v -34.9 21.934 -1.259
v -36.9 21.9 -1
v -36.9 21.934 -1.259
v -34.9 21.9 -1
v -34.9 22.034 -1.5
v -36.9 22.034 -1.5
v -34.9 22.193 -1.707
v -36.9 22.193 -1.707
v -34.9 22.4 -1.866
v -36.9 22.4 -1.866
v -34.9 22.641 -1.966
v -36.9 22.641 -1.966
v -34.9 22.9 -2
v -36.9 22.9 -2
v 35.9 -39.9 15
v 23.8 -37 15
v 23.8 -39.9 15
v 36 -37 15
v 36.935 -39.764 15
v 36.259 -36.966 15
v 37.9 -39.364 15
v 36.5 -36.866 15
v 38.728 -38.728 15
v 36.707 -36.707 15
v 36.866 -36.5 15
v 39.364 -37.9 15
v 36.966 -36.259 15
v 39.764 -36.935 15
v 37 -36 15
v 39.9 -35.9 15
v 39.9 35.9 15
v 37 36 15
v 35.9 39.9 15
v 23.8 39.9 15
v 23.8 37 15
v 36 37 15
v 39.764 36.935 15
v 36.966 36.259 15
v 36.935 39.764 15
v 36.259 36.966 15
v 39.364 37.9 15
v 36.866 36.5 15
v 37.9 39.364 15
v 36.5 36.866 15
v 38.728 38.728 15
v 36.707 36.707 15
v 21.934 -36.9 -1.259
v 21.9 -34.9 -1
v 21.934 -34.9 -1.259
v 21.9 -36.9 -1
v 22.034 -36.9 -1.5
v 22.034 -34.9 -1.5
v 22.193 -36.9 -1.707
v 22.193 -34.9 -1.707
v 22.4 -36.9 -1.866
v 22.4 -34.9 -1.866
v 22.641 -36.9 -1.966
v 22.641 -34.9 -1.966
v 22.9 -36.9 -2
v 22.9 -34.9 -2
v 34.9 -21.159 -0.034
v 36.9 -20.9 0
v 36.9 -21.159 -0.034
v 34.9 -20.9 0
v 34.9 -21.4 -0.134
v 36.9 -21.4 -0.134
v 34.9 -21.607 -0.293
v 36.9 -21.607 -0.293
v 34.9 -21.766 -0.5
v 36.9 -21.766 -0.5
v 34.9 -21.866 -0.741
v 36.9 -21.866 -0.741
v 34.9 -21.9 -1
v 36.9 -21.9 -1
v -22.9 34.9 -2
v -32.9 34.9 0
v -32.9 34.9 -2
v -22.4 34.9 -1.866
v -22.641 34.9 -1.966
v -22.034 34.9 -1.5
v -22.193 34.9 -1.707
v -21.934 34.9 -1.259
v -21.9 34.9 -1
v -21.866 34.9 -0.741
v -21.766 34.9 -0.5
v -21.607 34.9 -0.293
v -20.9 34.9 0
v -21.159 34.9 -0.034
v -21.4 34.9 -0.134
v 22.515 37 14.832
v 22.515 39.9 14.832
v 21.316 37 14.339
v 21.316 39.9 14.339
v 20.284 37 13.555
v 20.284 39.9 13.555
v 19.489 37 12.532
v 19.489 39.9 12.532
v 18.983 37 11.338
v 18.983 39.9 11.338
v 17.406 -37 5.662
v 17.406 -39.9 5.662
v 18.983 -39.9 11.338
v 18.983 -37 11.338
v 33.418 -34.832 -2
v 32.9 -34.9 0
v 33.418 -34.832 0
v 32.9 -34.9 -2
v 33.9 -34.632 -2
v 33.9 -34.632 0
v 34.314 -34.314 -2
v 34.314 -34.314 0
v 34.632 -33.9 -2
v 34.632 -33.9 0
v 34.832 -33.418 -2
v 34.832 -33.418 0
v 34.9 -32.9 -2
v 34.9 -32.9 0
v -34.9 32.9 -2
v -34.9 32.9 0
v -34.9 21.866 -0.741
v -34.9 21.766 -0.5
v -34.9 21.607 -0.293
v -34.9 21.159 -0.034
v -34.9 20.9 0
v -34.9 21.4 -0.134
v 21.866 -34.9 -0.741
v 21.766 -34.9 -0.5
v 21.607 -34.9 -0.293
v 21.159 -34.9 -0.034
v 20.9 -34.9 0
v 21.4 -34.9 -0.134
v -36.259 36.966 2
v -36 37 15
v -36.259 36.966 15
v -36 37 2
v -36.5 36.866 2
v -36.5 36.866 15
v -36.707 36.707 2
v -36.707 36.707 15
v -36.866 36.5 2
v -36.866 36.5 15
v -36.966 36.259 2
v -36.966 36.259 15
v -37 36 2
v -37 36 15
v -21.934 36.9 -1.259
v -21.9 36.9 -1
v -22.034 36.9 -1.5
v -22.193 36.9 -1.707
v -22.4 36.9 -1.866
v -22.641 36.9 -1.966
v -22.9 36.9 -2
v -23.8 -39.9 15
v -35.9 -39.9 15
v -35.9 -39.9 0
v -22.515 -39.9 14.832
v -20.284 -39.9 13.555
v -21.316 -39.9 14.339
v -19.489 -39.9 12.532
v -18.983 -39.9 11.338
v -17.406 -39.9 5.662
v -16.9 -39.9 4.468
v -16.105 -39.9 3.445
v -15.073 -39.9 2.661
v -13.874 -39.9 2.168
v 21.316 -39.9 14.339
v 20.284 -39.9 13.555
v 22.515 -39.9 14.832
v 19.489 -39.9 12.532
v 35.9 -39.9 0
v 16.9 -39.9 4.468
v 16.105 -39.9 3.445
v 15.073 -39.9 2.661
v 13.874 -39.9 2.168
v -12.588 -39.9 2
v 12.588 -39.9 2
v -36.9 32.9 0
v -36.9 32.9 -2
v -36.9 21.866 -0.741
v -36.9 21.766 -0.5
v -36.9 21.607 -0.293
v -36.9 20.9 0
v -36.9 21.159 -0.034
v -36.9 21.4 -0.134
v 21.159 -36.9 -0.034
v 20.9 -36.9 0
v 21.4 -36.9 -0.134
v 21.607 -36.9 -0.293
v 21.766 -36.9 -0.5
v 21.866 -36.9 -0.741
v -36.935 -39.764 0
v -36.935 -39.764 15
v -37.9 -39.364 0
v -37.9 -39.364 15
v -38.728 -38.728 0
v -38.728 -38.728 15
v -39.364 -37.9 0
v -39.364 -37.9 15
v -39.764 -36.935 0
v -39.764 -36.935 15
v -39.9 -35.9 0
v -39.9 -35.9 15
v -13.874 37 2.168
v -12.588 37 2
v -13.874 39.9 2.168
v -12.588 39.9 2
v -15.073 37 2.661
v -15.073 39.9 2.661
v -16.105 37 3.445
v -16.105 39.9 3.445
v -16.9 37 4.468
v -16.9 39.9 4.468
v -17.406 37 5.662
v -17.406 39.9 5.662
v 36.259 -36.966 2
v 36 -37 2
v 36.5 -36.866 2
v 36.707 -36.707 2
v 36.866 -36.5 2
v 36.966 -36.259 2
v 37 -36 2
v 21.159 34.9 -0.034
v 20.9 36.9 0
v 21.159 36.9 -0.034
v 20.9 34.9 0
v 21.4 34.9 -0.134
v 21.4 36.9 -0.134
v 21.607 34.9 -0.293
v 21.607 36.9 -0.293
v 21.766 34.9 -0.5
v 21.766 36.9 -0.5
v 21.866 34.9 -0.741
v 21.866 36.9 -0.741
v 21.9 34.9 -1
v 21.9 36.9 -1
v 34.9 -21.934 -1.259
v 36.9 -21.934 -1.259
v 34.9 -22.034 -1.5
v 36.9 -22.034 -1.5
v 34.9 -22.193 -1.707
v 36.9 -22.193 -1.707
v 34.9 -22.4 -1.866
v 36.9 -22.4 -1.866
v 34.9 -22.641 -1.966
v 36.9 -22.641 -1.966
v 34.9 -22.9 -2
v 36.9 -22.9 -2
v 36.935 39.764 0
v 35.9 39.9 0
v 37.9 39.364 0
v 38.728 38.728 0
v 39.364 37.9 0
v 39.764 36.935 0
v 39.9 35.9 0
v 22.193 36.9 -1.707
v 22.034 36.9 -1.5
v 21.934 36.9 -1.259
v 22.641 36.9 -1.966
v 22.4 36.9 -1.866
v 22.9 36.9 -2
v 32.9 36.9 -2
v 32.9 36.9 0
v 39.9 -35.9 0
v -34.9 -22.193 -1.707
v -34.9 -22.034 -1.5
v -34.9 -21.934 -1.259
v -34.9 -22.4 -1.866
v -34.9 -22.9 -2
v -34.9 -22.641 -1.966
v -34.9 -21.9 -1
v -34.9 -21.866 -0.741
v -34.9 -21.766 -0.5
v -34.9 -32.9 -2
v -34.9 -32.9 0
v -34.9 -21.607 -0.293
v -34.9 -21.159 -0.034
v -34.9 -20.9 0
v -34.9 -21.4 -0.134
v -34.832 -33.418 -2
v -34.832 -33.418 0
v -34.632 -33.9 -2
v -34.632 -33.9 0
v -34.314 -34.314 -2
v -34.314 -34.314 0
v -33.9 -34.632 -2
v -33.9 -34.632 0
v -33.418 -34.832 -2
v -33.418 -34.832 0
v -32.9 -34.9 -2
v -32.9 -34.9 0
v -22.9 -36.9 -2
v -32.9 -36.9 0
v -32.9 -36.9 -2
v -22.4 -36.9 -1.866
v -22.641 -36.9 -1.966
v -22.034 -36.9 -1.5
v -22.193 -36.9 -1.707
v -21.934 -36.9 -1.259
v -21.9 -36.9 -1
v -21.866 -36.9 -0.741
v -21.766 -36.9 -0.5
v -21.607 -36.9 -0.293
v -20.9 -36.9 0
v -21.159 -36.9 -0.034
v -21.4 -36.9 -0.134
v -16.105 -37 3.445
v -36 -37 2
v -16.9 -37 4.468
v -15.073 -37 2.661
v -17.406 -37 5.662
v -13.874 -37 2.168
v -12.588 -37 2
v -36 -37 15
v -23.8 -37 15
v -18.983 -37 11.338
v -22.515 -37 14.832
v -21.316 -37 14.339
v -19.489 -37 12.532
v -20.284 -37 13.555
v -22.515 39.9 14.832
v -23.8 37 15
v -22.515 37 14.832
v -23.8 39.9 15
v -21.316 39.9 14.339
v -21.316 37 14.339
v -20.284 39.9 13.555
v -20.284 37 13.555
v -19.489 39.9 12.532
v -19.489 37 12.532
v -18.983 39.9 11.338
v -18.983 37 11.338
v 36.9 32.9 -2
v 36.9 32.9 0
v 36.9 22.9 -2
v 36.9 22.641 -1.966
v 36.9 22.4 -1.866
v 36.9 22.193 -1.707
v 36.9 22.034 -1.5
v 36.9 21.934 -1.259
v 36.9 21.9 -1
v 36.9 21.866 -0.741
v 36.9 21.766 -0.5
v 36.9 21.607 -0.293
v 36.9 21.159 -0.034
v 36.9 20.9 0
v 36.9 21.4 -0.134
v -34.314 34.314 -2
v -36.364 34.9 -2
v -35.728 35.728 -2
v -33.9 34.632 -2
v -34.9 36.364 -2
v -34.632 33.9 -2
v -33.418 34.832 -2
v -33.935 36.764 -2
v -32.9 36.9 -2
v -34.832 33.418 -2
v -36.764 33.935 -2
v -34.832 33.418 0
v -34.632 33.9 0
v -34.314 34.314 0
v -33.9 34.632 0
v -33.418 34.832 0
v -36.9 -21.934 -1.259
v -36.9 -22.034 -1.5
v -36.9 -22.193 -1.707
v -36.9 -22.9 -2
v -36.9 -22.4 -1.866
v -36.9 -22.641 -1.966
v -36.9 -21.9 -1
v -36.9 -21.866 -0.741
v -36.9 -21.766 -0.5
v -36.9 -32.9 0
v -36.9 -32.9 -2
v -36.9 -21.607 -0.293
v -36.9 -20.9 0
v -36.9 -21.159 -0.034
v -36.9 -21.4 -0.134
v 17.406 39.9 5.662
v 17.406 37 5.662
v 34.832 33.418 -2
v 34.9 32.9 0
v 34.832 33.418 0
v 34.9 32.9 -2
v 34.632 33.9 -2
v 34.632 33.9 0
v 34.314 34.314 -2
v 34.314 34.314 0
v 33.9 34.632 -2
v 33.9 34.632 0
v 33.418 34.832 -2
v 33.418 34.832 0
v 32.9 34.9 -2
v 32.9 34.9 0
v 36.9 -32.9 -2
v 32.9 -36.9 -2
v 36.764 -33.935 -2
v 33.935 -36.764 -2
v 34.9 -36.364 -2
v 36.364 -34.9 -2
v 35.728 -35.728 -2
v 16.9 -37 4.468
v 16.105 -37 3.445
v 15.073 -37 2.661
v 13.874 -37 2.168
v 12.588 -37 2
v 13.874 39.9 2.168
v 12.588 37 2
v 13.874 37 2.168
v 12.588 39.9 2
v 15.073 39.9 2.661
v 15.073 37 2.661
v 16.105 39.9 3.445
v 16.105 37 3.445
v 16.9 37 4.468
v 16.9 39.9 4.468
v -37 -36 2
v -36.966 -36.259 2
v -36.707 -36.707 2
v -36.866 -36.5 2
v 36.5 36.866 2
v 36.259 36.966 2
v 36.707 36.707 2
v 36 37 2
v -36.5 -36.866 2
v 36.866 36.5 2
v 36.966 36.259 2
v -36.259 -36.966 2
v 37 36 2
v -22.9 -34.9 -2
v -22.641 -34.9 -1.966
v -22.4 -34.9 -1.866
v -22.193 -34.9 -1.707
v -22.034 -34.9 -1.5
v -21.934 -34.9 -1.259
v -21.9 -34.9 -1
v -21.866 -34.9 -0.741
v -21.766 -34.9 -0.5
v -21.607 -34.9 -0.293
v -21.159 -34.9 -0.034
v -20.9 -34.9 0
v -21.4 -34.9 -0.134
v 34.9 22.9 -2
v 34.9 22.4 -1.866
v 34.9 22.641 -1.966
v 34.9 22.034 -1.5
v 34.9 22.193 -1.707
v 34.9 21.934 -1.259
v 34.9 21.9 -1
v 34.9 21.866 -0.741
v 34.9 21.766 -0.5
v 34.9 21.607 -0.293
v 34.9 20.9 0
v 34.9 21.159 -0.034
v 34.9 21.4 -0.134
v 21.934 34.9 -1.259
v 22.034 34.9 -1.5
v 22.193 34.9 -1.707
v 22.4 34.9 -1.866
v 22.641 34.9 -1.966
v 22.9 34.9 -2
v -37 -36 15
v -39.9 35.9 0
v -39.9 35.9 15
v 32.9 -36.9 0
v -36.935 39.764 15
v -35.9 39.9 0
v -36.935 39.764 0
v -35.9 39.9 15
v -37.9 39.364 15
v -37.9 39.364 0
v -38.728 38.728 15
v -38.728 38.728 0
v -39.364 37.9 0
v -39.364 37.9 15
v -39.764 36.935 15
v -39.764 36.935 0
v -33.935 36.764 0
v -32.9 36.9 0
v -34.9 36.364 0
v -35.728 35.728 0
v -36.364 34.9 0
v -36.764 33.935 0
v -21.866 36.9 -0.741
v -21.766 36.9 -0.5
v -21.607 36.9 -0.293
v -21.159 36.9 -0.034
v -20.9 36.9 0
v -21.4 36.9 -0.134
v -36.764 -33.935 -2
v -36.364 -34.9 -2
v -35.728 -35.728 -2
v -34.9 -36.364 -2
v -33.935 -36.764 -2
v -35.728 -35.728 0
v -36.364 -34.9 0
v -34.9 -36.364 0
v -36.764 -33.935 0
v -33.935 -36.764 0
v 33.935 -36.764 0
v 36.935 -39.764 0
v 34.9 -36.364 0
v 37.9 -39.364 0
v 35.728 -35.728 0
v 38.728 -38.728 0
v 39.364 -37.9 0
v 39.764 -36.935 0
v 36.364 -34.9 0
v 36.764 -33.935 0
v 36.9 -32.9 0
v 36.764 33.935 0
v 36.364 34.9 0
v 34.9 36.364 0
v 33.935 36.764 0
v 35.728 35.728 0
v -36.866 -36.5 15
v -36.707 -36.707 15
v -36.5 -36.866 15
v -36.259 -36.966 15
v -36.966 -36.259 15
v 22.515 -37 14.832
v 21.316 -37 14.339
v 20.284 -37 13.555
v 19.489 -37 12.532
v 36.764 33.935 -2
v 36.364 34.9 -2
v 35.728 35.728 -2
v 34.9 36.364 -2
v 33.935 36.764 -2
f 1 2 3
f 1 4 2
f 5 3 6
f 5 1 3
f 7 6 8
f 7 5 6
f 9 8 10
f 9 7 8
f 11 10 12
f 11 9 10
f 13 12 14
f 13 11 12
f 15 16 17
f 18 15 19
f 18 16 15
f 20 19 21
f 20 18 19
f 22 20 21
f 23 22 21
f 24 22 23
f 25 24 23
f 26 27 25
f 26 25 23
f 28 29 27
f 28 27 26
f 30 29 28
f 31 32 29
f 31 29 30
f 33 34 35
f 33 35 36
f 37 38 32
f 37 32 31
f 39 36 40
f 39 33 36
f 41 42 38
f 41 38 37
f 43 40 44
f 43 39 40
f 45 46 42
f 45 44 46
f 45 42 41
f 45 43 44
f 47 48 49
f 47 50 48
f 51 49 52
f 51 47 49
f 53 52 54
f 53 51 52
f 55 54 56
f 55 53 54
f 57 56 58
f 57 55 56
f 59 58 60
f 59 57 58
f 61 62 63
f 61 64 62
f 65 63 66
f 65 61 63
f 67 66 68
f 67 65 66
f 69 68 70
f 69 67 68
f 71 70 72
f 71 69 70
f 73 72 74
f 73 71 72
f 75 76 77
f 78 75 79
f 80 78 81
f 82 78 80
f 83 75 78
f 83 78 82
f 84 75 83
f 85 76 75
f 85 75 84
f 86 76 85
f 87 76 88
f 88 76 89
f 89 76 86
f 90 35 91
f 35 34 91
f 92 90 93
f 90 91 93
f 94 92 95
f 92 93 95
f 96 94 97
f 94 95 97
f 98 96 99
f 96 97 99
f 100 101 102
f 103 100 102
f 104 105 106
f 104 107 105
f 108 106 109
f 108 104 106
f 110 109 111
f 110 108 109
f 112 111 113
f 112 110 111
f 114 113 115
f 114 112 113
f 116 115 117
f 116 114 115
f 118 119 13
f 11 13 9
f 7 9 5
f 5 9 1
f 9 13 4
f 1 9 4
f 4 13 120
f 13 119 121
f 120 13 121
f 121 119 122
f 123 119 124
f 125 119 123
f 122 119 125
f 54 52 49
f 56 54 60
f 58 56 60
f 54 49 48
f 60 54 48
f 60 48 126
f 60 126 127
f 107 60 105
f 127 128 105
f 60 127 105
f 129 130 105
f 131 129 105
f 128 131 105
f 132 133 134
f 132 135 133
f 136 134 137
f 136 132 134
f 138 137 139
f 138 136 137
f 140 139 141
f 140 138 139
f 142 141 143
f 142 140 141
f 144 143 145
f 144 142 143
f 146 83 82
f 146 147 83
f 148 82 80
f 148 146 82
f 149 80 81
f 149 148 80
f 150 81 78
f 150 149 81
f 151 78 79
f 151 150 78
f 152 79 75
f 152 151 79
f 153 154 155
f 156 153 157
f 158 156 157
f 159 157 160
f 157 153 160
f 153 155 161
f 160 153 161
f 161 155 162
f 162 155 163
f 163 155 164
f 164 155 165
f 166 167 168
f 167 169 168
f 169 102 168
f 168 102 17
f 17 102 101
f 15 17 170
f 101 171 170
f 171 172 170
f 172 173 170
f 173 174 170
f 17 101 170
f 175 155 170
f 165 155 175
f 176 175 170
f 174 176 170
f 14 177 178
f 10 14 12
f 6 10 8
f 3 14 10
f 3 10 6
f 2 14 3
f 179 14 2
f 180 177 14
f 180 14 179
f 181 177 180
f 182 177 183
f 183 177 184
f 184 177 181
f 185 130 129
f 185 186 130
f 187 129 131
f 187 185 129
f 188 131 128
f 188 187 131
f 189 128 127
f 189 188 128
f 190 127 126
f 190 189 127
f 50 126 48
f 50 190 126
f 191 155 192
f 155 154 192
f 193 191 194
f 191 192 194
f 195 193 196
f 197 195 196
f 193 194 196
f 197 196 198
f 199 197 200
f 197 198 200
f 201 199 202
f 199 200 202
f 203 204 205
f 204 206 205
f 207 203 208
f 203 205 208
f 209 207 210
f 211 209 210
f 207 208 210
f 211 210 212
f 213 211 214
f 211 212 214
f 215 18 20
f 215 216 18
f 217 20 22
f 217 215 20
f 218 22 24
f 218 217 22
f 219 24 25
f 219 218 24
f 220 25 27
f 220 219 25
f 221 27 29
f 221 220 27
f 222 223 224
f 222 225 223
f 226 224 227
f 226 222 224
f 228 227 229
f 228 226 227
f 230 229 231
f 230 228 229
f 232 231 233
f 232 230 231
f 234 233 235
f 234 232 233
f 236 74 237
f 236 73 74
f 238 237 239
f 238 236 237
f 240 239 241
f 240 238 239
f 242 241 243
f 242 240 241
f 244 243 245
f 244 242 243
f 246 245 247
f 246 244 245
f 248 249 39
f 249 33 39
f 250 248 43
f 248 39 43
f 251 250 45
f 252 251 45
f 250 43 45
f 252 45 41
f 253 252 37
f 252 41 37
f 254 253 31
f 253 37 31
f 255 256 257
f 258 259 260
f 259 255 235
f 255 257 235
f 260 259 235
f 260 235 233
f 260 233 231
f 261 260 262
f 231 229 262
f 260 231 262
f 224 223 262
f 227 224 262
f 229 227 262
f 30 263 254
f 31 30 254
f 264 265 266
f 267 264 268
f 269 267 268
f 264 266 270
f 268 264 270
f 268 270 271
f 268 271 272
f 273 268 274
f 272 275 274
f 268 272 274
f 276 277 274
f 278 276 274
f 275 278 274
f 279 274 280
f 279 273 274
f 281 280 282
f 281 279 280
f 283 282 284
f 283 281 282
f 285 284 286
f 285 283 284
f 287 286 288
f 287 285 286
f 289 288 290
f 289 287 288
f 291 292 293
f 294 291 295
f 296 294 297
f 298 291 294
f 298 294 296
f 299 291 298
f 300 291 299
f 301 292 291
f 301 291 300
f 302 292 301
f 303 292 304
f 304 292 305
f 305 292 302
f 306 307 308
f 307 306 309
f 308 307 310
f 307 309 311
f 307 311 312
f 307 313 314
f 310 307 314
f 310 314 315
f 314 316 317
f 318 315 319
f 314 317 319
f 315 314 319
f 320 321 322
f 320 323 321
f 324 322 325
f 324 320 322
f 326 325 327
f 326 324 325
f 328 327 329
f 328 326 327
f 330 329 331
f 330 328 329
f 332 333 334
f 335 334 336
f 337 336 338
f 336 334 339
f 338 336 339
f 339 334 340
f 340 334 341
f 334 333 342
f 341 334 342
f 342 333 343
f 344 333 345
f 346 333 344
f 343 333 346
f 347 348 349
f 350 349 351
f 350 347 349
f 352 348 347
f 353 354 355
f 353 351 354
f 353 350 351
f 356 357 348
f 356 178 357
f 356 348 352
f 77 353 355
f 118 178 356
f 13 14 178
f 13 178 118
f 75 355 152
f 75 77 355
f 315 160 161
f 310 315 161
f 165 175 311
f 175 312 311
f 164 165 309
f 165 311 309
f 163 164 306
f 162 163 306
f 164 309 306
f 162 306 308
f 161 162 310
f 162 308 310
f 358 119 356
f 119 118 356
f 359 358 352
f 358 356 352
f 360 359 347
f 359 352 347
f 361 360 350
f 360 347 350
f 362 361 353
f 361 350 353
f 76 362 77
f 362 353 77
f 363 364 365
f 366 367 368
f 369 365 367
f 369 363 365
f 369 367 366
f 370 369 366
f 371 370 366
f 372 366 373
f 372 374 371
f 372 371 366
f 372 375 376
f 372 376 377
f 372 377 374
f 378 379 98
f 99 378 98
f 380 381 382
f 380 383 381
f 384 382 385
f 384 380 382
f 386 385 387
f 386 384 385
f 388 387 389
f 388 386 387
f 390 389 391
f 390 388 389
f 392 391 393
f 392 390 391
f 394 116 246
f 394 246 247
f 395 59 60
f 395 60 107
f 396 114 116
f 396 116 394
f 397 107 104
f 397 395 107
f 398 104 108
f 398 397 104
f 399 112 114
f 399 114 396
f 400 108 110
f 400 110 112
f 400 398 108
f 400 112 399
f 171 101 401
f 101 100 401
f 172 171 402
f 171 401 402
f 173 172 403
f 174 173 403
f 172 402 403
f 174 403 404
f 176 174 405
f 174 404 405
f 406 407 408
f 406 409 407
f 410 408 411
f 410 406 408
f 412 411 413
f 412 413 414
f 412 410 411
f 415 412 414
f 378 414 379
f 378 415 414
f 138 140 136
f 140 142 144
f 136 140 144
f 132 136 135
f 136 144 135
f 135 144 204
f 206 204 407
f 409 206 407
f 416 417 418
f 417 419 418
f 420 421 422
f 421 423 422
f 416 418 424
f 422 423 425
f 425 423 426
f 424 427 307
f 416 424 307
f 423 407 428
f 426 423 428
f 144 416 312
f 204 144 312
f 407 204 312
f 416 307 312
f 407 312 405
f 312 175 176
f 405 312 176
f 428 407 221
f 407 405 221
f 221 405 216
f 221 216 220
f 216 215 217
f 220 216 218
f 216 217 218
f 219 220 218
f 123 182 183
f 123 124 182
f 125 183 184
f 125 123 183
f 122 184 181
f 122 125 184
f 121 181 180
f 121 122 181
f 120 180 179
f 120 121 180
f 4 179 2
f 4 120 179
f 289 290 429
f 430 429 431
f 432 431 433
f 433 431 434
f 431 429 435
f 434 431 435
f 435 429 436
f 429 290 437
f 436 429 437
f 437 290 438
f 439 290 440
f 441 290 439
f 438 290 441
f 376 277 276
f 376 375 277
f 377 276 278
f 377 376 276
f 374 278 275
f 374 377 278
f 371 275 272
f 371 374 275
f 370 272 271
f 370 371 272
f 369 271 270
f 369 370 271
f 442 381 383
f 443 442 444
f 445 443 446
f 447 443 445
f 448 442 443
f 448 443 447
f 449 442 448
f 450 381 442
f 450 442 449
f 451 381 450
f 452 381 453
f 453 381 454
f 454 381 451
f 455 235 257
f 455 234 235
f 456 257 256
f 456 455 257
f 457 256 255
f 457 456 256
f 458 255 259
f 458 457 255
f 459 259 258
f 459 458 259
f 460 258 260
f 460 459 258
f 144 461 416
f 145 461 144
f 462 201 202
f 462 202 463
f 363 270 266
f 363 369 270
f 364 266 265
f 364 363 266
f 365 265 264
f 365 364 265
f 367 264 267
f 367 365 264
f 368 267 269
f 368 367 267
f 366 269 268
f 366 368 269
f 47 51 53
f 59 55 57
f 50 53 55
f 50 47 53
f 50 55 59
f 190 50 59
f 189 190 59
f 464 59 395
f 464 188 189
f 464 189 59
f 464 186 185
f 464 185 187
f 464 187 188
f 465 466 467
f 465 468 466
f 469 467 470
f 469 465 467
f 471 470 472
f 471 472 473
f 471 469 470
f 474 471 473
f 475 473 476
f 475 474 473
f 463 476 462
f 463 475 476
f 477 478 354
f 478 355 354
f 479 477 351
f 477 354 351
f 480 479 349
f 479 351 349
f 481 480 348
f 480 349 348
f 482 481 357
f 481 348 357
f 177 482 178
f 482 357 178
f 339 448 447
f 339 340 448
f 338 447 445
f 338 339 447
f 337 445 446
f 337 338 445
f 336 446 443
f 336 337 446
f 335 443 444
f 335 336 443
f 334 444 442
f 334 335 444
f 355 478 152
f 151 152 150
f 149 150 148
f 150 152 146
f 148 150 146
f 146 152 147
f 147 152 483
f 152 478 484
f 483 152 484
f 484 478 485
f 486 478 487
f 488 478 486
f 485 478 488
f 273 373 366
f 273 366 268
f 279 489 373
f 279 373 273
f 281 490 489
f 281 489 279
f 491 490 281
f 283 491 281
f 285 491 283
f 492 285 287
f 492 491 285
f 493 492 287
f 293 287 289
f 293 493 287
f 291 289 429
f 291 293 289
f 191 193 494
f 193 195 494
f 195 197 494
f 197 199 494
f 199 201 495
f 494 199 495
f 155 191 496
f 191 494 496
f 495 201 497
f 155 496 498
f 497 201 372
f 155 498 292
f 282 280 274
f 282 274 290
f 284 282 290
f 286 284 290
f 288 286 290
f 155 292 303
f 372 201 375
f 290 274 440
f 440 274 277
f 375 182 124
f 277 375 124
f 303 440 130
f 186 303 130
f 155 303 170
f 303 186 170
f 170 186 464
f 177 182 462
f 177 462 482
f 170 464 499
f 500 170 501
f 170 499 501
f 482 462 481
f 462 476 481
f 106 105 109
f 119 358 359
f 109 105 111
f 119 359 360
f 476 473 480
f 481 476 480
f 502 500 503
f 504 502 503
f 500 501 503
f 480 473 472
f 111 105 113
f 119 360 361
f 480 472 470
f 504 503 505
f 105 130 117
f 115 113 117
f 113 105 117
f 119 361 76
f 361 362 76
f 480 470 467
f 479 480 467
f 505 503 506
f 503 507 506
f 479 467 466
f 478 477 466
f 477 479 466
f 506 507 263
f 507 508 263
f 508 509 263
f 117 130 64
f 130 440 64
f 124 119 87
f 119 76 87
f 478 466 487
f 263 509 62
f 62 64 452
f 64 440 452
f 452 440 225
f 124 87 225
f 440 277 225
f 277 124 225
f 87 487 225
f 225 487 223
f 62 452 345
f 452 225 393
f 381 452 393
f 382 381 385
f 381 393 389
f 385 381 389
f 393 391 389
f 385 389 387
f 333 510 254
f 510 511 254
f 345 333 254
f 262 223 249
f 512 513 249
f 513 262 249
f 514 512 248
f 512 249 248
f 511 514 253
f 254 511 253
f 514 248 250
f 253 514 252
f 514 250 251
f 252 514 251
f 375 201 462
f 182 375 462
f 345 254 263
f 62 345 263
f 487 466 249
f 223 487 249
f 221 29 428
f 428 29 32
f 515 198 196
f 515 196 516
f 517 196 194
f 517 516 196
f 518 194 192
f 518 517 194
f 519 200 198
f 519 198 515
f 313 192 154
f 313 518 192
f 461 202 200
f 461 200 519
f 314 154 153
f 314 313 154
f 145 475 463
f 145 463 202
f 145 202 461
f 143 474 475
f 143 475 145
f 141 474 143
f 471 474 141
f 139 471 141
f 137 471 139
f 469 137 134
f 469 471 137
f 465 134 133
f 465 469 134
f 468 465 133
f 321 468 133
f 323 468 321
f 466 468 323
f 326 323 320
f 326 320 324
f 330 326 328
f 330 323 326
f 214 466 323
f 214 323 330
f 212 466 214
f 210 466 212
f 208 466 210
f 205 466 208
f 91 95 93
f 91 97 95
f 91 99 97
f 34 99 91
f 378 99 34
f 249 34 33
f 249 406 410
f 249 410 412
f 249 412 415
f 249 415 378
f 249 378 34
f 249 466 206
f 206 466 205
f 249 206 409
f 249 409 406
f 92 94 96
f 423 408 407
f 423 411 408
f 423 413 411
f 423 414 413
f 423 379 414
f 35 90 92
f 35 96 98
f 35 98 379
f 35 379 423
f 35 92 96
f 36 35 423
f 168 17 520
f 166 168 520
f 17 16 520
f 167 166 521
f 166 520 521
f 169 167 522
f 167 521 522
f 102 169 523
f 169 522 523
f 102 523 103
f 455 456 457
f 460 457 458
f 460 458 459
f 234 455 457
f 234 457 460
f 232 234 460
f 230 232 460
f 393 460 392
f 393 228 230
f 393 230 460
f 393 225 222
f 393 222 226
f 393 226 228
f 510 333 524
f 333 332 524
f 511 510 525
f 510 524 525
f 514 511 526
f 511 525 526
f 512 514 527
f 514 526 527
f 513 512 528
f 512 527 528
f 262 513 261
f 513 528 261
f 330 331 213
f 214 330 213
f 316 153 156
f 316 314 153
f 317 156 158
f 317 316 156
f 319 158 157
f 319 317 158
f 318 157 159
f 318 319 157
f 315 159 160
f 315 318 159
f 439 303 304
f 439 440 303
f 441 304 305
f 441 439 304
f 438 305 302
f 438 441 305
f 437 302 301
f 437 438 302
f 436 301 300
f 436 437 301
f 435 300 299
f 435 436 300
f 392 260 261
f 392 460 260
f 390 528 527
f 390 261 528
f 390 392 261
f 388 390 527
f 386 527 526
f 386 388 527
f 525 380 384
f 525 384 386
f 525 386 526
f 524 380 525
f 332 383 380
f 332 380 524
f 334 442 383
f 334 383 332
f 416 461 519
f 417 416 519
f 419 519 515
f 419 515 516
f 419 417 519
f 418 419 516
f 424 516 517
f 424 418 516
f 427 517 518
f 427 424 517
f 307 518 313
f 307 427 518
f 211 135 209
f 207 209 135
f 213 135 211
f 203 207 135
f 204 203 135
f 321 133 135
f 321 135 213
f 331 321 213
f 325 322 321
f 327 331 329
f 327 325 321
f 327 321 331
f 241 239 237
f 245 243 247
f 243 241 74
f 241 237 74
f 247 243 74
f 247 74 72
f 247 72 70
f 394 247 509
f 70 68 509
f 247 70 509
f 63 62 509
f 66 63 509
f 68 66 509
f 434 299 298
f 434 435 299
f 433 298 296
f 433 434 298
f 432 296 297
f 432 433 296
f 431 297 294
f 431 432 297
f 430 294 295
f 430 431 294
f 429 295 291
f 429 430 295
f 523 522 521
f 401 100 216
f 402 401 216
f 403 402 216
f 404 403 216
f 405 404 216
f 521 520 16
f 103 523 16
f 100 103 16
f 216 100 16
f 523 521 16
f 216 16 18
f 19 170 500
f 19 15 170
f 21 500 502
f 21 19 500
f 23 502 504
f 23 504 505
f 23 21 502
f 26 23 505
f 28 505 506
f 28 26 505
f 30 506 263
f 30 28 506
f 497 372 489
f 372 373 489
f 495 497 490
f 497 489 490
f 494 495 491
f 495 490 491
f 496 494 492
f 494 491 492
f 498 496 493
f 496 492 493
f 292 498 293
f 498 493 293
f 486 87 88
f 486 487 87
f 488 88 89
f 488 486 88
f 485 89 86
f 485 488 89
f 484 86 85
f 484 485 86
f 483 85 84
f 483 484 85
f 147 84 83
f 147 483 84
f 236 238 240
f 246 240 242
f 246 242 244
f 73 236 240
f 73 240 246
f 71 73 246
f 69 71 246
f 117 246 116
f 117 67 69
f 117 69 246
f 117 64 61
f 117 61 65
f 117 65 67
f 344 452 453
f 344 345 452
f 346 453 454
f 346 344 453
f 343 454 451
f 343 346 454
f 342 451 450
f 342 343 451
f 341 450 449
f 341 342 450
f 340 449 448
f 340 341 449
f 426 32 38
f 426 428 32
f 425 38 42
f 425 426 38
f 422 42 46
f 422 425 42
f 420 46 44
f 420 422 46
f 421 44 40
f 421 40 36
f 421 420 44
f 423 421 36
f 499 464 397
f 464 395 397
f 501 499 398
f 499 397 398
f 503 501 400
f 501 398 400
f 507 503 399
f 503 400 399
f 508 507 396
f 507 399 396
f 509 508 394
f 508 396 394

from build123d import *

# Parameters (mm, degrees)
F0_W      = 79.8
F0_H      = 79.8
F1_DEPTH  = 15
F2_W      = 74
F2_H      = 74
F3_DEPTH  = 13
F4_W      = 73.8
F4_H      = 73.8
F4_W_2    = 69.8
F4_H_2    = 69.8
F5_DEPTH  = 2
F7_DEPTH  = 2
F8_R      = 2
F9_R      = 4
F10_R     = 0.99999
F12_DEPTH = 79.801
F13_R     = 5
F14_R     = 4
F15_R     = 1


# Not quite as in the source:
# - a fillet or chamfer is up to 0.001 mm smaller than in the source, because OpenCascade refuses the exact size


with BuildPart() as f1:
    # F0 (on Top) → F1 (new body)
    with BuildSketch(Plane.XY):
        Rectangle(F0_W, F0_H)
    extrude(amount=F1_DEPTH)

    # F2 (on face) → F3 (cut)
    with BuildSketch(Plane.XY.offset(15)):
        Rectangle(F2_W, F2_H)
    extrude(amount=-F3_DEPTH, mode=Mode.SUBTRACT)

    # F4 (on face) → F5 (join)
    with BuildSketch(Plane(origin=(0, 0, 0), x_dir=(1, 0, 0), z_dir=(0, 0, -1))):
        Rectangle(F4_W, F4_H)
        Rectangle(F4_W_2, F4_H_2, mode=Mode.SUBTRACT)
    extrude(amount=F5_DEPTH)

    # F6 (on face) → F7 (cut, through all)
    with BuildSketch(Plane(origin=(0, 0, -2), x_dir=(1, 0, 0), z_dir=(0, 0, -1))):
        Polygon((36.9, -21.9), (36.9, 21.9), (21.9, 21.9), (21.9, 36.9), (-21.9, 36.9), (-21.9, 21.9), (-36.9, 21.9), (-36.9, -21.9), (-21.9, -21.9), (-21.9, -36.9), (21.9, -36.9), (21.9, -21.9), align=None)
    extrude(amount=-F7_DEPTH, mode=Mode.SUBTRACT)

    # F8
    f8_edges = [f1.edges().sort_by_distance(p)[0] for p in [
        (-34.9, 34.9, -1),
        (-34.9, -34.9, -1),
        (34.9, -34.9, -1),
        (34.9, 34.9, -1),
    ]]
    fillet(f8_edges, radius=F8_R)

    # F9
    f9_edges = [f1.edges().sort_by_distance(p)[0] for p in [
        (-36.9, 36.9, -1),
        (36.9, 36.9, -1),
        (36.9, -36.9, -1),
        (-36.9, -36.9, -1),
    ]]
    fillet(f9_edges, radius=F9_R)

    # F10 (radius 1 in the source; OpenCascade refuses exactly that, so slightly less here)
    f10_edges = [f1.edges().sort_by_distance(p)[0] for p in [
        (21.9, -35.9, -2),
        (21.9, -35.9, 0),
        (35.9, -21.9, -2),
        (35.9, -21.9, 0),
        (-35.9, -21.9, -2),
        (-35.9, -21.9, 0),
        (-21.9, -35.9, -2),
        (-21.9, -35.9, 0),
        (-35.9, 21.9, -2),
        (-35.9, 21.9, 0),
        (-21.9, 35.9, -2),
        (-21.9, 35.9, 0),
        (21.9, 35.9, -2),
        (21.9, 35.9, 0),
        (35.9, 21.9, -2),
        (35.9, 21.9, 0),
    ]]
    fillet(f10_edges, radius=F10_R)

    # F11 (on face) → F12 (cut, through all)
    with BuildSketch(Plane.XZ.offset(39.9)):
        Polygon((20, 15), (-20, 15), (-16.3888888889, 2), (16.3888888889, 2), align=None)
    extrude(amount=-F12_DEPTH, mode=Mode.SUBTRACT)

    # F13
    f13_edges = [f1.edges().sort_by_distance(p)[0] for p in [
        (-20, -38.45, 15),
        (-16.388889, -38.45, 2),
        (16.388889, -38.45, 2),
        (20, -38.45, 15),
        (16.388889, 38.45, 2),
        (20, 38.45, 15),
        (-20, 38.45, 15),
        (-16.388889, 38.45, 2),
    ]]
    fillet(f13_edges, radius=F13_R)

    # F14
    f14_edges = [f1.edges().sort_by_distance(p)[0] for p in [
        (39.9, -39.9, 7.5),
        (39.9, 39.9, 7.5),
        (-39.9, -39.9, 7.5),
        (-39.9, 39.9, 7.5),
    ]]
    fillet(f14_edges, radius=F14_R)

    # F15
    f15_edges = [f1.edges().sort_by_distance(p)[0] for p in [
        (37, 37, 8.5),
        (-37, 37, 8.5),
        (-37, -37, 8.5),
        (37, -37, 8.5),
    ]]
    fillet(f15_edges, radius=F15_R)


solid = f1.part
